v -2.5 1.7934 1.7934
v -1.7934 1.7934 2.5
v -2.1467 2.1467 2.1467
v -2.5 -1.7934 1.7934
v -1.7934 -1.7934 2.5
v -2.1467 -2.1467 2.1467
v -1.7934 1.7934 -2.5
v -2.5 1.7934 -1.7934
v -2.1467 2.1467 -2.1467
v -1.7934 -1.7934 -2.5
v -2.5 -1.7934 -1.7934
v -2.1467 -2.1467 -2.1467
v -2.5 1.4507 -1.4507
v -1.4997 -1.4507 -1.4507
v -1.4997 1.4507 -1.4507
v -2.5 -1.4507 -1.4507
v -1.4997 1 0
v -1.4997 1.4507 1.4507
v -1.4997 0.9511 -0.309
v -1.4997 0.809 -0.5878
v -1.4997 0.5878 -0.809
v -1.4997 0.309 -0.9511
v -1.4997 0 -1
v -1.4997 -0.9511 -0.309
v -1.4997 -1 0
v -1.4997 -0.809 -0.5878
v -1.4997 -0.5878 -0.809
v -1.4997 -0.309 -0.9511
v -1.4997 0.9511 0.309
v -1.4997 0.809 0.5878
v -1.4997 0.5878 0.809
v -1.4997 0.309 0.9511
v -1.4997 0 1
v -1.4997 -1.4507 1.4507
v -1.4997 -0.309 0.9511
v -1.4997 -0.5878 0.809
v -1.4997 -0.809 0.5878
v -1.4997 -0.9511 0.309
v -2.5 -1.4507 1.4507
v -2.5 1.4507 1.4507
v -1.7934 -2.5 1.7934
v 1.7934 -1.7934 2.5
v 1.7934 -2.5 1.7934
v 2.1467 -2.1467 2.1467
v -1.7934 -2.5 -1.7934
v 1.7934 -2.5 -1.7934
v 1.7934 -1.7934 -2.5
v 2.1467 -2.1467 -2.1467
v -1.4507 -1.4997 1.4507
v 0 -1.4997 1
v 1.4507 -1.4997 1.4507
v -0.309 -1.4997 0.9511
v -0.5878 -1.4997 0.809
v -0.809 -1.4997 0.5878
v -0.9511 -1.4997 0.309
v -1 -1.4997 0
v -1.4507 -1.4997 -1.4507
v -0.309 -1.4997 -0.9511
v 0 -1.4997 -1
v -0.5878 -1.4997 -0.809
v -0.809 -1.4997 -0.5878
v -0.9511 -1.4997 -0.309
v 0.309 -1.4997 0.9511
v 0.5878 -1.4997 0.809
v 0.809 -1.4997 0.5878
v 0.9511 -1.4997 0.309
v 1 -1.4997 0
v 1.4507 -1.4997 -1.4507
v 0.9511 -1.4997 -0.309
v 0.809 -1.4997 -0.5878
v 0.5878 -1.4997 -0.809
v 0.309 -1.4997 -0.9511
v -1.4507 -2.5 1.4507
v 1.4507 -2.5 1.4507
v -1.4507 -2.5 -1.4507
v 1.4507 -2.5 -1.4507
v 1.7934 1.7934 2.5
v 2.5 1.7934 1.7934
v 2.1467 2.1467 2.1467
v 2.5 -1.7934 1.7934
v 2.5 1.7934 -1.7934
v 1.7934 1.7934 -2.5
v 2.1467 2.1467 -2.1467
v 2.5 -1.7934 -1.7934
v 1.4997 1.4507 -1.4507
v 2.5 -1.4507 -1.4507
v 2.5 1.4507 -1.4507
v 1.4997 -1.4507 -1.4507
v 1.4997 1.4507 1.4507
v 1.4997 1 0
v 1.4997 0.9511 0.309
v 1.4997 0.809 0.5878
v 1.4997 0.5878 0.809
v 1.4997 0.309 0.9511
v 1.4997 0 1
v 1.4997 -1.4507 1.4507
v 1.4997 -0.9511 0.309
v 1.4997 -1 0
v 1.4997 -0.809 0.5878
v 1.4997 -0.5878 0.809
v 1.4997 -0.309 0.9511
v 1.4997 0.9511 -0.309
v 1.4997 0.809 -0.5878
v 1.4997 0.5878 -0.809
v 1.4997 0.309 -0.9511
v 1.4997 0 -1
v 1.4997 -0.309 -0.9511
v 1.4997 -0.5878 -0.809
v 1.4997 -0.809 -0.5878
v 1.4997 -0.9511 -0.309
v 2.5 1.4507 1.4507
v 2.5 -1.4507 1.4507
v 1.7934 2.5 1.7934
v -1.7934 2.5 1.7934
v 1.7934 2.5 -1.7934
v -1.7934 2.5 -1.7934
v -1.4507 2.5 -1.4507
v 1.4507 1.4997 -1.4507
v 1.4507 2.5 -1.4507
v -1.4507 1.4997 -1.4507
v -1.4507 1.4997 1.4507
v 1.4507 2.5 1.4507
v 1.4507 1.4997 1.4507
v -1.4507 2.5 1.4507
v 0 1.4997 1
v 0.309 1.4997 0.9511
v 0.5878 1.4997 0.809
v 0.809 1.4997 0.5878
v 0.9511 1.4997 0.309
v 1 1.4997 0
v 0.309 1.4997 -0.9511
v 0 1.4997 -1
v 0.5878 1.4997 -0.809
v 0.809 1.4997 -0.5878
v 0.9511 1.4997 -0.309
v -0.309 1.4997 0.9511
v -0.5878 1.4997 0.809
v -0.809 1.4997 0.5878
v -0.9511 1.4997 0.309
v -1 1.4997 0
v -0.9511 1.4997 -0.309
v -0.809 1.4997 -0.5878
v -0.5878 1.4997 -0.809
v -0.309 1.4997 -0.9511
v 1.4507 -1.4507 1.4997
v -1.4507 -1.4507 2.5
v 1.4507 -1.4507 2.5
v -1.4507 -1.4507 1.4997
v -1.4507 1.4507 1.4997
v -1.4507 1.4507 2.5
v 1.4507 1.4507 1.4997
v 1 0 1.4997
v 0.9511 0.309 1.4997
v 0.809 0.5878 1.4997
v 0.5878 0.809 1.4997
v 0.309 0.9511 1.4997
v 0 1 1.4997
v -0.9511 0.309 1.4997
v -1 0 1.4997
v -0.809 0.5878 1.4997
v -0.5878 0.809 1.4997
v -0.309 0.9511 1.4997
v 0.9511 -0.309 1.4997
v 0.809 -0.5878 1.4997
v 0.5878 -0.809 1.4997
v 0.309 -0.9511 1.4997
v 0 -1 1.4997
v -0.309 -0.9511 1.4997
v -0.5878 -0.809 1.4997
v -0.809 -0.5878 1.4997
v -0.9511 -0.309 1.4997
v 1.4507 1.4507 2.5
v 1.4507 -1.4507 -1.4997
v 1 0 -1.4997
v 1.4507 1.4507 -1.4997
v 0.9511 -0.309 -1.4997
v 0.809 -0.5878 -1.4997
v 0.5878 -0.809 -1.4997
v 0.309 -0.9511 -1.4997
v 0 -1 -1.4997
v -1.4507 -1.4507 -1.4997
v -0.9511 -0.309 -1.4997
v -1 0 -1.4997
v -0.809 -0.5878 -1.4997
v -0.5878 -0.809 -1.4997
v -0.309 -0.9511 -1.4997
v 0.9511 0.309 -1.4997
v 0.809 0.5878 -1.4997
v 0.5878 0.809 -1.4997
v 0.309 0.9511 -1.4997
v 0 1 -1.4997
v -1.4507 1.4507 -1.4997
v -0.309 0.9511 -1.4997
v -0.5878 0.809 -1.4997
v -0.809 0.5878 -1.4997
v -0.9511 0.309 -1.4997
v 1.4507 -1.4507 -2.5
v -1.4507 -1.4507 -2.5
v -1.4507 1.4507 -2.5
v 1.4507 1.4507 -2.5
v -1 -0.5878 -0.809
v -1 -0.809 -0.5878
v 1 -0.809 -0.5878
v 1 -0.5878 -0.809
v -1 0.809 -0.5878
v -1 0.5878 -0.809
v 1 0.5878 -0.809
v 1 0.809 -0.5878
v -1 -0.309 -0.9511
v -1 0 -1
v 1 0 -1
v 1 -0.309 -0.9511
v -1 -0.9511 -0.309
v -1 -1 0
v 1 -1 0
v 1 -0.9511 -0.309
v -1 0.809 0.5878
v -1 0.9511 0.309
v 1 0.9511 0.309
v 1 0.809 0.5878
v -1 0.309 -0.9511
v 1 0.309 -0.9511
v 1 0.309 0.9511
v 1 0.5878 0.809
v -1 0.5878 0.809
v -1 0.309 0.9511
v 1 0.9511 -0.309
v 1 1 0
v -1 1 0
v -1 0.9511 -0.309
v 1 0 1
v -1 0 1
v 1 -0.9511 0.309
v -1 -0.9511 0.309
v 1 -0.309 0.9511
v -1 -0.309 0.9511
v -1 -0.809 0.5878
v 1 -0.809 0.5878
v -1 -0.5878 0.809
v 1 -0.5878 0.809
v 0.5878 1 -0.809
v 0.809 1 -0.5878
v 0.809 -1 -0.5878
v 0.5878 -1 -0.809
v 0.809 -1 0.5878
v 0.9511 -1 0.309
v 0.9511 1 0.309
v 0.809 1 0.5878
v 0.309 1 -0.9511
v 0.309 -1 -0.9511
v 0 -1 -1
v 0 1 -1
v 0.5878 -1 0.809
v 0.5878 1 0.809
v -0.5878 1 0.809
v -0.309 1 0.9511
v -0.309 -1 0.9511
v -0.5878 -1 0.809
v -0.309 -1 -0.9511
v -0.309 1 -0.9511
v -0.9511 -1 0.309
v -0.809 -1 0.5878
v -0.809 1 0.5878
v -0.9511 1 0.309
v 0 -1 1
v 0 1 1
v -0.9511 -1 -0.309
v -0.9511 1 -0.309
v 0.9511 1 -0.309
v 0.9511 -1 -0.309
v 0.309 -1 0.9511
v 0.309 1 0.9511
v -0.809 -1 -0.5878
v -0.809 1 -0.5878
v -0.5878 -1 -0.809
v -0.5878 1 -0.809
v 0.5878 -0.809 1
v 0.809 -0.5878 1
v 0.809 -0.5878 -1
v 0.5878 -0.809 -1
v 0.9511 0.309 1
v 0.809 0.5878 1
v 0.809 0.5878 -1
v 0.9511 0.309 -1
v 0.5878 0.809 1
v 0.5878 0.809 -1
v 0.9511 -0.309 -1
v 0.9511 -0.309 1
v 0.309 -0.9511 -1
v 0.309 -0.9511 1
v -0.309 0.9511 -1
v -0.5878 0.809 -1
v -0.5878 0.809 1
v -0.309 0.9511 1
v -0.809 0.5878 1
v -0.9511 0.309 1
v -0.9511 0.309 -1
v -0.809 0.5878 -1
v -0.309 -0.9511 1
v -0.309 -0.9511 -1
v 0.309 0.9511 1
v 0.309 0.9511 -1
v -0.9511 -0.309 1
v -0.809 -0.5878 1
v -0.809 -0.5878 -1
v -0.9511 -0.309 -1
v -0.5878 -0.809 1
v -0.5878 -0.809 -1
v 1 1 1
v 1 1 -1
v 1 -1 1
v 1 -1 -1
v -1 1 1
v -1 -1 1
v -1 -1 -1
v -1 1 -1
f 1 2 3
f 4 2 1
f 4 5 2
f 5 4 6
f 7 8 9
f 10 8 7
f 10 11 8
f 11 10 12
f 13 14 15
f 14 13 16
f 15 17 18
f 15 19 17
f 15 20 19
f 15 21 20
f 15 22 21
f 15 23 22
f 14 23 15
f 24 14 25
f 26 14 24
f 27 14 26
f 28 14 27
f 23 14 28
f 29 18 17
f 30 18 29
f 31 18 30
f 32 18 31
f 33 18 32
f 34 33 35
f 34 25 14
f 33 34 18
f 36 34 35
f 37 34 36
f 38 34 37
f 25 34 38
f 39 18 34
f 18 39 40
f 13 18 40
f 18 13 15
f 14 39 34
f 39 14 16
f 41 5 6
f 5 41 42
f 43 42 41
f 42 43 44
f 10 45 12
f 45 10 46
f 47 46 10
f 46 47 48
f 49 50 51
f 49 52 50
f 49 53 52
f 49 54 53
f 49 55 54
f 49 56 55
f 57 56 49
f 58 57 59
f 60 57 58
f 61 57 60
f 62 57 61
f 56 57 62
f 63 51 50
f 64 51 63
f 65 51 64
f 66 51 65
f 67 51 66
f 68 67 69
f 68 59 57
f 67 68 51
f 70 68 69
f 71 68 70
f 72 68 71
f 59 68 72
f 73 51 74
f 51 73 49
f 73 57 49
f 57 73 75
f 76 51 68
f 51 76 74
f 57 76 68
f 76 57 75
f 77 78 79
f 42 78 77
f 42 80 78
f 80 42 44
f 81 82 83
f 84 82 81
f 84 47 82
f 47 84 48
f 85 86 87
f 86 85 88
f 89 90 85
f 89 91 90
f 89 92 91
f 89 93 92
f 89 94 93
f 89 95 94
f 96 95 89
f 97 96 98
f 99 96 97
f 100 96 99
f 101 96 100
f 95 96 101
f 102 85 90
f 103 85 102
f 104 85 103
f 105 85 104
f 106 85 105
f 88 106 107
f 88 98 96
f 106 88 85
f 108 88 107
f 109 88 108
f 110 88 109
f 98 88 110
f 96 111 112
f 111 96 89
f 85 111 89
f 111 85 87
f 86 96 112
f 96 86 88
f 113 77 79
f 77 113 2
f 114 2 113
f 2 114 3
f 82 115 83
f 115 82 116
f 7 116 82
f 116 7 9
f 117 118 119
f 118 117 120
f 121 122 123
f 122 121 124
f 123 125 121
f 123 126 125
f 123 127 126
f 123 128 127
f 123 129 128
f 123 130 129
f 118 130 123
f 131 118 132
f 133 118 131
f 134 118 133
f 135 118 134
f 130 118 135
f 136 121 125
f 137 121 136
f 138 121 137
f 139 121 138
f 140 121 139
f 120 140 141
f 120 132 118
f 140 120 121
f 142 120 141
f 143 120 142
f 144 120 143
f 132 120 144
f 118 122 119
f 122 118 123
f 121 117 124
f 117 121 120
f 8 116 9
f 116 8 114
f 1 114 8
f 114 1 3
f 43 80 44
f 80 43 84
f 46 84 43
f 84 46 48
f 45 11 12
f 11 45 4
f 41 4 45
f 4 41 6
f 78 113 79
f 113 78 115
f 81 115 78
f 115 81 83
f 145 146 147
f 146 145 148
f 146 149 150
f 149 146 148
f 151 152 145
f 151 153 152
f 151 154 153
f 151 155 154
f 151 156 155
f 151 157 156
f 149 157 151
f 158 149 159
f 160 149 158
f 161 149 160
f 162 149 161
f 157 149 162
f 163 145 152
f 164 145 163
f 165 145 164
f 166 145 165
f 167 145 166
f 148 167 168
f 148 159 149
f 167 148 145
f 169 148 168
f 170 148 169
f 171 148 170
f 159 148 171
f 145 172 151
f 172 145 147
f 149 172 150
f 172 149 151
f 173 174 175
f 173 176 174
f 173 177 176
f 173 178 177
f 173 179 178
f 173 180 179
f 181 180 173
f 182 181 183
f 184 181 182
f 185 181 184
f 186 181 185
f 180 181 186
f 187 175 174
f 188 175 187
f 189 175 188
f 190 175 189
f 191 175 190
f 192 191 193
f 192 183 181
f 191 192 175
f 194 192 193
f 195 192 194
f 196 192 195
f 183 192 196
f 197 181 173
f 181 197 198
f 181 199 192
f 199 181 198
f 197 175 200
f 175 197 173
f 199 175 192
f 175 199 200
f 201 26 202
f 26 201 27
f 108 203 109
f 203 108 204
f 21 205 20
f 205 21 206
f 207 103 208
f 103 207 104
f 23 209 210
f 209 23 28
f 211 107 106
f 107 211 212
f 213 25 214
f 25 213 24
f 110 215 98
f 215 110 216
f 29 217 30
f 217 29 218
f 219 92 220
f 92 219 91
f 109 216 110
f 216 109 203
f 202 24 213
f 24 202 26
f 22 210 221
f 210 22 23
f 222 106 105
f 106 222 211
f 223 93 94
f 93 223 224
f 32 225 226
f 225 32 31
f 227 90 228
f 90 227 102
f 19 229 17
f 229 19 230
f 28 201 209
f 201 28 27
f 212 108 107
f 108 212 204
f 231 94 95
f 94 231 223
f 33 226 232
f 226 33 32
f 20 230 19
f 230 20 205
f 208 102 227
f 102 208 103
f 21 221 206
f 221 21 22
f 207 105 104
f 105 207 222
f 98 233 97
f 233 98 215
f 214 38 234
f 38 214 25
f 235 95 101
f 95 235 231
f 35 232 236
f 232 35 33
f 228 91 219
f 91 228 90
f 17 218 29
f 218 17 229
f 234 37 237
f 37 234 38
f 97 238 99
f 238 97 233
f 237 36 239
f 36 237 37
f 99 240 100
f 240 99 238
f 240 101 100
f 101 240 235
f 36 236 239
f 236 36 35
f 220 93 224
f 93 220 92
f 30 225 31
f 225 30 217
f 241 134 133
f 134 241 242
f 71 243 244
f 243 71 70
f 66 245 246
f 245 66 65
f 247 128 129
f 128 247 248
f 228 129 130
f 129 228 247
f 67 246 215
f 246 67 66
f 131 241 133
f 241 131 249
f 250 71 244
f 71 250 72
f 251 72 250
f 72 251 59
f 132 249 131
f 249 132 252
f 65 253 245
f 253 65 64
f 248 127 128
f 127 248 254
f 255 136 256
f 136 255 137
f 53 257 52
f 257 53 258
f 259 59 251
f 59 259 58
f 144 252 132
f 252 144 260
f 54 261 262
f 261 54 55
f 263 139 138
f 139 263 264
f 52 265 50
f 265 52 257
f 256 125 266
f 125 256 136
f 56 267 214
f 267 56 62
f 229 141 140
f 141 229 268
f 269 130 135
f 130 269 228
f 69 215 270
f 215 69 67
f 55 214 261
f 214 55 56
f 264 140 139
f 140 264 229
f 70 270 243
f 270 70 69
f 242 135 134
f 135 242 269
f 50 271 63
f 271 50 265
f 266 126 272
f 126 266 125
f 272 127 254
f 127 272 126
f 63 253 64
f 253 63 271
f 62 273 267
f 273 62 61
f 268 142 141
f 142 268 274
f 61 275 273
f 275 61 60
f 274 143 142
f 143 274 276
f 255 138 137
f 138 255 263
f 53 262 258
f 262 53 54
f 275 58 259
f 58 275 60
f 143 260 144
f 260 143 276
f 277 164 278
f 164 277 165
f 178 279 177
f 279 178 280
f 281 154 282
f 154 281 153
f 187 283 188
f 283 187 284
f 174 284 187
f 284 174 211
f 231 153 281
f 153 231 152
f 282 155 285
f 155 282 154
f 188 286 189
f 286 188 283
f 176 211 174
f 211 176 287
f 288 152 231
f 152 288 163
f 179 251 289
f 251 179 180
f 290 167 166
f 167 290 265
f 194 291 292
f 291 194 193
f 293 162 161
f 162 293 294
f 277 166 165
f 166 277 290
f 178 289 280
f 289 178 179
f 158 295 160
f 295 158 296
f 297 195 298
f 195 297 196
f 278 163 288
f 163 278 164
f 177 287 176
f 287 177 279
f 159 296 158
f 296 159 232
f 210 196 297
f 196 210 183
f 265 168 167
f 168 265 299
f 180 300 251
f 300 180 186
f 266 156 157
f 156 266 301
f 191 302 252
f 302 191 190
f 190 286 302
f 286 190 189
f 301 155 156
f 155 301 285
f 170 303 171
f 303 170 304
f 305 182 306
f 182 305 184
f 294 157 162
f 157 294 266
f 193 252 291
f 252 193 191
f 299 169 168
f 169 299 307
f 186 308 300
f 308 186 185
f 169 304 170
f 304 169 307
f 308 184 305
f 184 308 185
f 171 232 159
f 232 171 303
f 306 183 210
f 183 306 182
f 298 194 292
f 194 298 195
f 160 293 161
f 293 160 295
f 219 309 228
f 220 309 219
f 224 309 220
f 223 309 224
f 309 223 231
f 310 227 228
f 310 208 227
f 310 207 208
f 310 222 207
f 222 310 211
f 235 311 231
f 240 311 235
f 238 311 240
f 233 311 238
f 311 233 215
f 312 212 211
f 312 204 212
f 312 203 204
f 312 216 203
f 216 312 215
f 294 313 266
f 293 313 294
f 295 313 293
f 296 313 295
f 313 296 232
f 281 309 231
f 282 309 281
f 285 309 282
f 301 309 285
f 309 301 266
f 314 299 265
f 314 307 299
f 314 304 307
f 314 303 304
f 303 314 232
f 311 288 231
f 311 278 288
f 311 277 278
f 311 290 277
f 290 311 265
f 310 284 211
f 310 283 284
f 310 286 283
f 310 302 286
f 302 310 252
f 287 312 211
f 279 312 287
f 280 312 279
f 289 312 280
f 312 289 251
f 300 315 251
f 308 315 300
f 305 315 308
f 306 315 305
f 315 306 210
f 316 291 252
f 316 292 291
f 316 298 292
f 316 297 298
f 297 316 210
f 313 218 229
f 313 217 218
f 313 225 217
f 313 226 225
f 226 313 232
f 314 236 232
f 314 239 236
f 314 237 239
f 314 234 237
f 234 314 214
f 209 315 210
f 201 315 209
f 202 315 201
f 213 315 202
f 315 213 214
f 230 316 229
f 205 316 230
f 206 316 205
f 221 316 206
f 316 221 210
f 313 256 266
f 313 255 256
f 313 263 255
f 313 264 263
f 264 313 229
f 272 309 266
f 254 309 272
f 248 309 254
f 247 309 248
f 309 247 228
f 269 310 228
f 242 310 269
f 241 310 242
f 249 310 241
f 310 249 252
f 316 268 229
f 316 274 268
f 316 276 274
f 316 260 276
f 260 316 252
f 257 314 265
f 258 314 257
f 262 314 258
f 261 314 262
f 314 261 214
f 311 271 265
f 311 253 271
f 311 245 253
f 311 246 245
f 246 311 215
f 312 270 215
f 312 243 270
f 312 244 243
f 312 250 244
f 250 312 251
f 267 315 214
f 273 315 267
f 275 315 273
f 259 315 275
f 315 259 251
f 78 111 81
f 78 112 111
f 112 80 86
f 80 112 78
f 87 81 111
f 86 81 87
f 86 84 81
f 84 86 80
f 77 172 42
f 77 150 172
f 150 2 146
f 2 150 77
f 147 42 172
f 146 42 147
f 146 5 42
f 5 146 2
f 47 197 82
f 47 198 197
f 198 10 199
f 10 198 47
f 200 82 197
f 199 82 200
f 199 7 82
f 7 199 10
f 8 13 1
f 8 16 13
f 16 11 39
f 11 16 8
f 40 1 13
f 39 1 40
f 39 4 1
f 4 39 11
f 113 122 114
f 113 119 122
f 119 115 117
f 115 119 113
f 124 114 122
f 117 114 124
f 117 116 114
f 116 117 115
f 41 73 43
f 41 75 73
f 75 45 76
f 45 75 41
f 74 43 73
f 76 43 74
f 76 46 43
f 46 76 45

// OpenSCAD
shaft_radius = 1;
$fn = 20;



module girdir(x_size=1, y_size=1, shaft_radius = shaft_radius)
{
    
    // Make primitive cube.
    hexad = 1.0000*[5,5,5];
    // Extract length.
    hexad_length = hexad[0];
    
    difference()
    {
        for ( x_step = [ 0 : hexad_length : hexad_length * x_size - 1] )
        {
            for ( y_step = [ 0 : hexad_length : hexad_length * y_size - 1] )
            {
                difference()
                {
                    union()
                    {
                        // Creates the cube.
                        translate([x_step, y_step, 0])
                        {
                            cube(hexad, center = true);
                        }
                    }
                    
                    x_final = hexad_length * x_size - hexad_length;
                    y_final = hexad_length * y_size - hexad_length;
                    
                    // Special treatment operations.
                    translate([x_step, y_step, 0])
                    {
                        
                        // Treat First.
                        if (x_step == 0)
                        {
                            girdir_trim("y","-x","+z");
                            girdir_trim("y","-x","-z");
                            girdir_cavity("-x");

                        }
                        
                        // Treat First.
                        if (y_step == 0)
                        {
                            girdir_trim("x","-y","+z");
                            girdir_trim("x","-y","-z");
                            girdir_cavity("-y");
                        }
                        
                        if (x_step == 0 && y_step == 0)
                        {
                            girdir_trim("z","-y","-x");
                        }
                       
                        // Treat First.
                        if (x_step == x_final)
                        {
                            girdir_trim("y","+x","+z");
                            girdir_trim("y","+x","-z");
                            girdir_cavity("+x");
                        }
                        
                        // Treat First.
                        if (y_step == y_final)
                        {
                            girdir_trim("x","+y","+z");
                            girdir_trim("x","+y","-z");
                            girdir_cavity("+y");
                        }
                        
                        if (x_step == 0 && y_step == y_final)
                        {
                            girdir_trim("z","+y","-x");
                            girdir_trim("x","+y","+z");
                            girdir_trim("x","+y","-z");
                        }
                        
                        if (x_step == x_final && y_step == 0)
                        {
                            girdir_trim("y","+x","+z");
                            girdir_trim("y","+x","-z");
                            girdir_trim("z","-y","+x");
                        }
                        
                        if (x_step == x_final && y_step == y_final)
                        {
                            girdir_trim("z","+y","+x");
                   
                        }
                        girdir_cavity("+z");
                        girdir_cavity("-z");
                    }
                    
                    // Shafts.
                    translate([x_step, y_step, 0])
                    {
                        
                        // Cylinder along  x axis.
                        rotate([0,90,0])
                        {
                            cylinder( h = 20, r1 = shaft_radius, r2=shaft_radius, center=true );
                        }
                        // Cylinder along  y axis.
                        rotate([90,0,0])
                        {
                            cylinder( h = 20, r1 = shaft_radius, r2=shaft_radius, center=true );
                        }
                        // Cylinder along  z axis.
                        
                        
                        cylinder( h = 20, r1 = shaft_radius, r2=shaft_radius, center=true );
                        
                        
                        
                       
                        
                    }
                    
                    // Inner flush.
                    translate([x_step, y_step, 0])
                    {
                        girdir_flush();
                    }
                }

            }
        }
        
    }
}

module prime_girdir(x_size=1, y_size=1, shaft_radius = shaft_radius)
{
    
    // Make primitive cube.
    hexad = 1.00001*[5,5,5];
    // Extract length.
    hexad_length = hexad[0];
    
    difference()
    {
        for ( x_step = [ 0 : hexad_length : hexad_length * x_size - 1] )
        {
            for ( y_step = [ 0 : hexad_length : hexad_length * y_size - 1] )
            {
                difference()
                {
                    union()
                    {
                        // Creates the cube.
                        translate([x_step, y_step, 0])
                        {
                            cube(hexad, center = true);
                        }
                    }
                    
                    x_final = hexad_length * x_size - hexad_length;
                    y_final = hexad_length * y_size - hexad_length;
                    z_final = hexad_length * z_size - hexad_length;
                    
                    // Special treatment operations.
                    translate([x_step, y_step, 0])
                    {
                        
                        // Treat First.
                        if (x_step == 0)
                        {
                            //girdir_trim("y","-x","+z");
                            //girdir_trim("y","-x","-z");
                            //girdir_cavity("-x");

                        }
                        
                        // Treat First.
                        if (y_step == 0)
                        {
                            //girdir_trim("x","-y","+z");
                            //girdir_trim("x","-y","-z");
                            //girdir_cavity("-y");
                        }
                        
                        if (x_step == 0 && y_step == 0)
                        {
                            //girdir_trim("z","-y","-x");
                        }
                       
                        // Treat First.
                        if (x_step == x_final)
                        {
                            //girdir_trim("y","+x","+z");
                            //girdir_trim("y","+x","-z");
                            //girdir_cavity("+x");
                        }
                        
                        // Treat First.
                        if (y_step == y_final)
                        {
                            //girdir_trim("x","+y","+z");
                            //girdir_trim("x","+y","-z");
                            //girdir_cavity("+y");
                        }
                        
                        if (x_step == 0 && y_step == y_final)
                        {
                            //girdir_trim("z","+y","-x");
                            //girdir_trim("x","+y","+z");
                            //girdir_trim("x","+y","-z");
                        }
                        
                        if (x_step == x_final && y_step == 0)
                        {
                            //girdir_trim("y","+x","+z");
                            //girdir_trim("y","+x","-z");
                            //girdir_trim("z","-y","+x");
                        }
                        
                        if (x_step == x_final && y_step == y_final)
                        {
                            //girdir_trim("z","+y","+x");
                        }
                        //girdir_cavity("+z");
                        //girdir_cavity("-z");
                    }
                    
                    // Shafts.
                    translate([x_step, y_step, 0])
                    {
                        
                        // Cylinder along  x axis.
                        rotate([0,90,0])
                        {
                            //cylinder( h = 20, r1 = shaft_radius, r2=shaft_radius, center=true );
                        }
                        // Cylinder along  y axis.
                        rotate([90,0,0])
                        {
                            //cylinder( h = 20, r1 = shaft_radius, r2=shaft_radius, center=true );
                        }
                        // Cylinder along  z axis.
                        
                        
                        //cylinder( h = 20, r1 = shaft_radius, r2=shaft_radius, center=true );
                        
                        
                        
                       
                        
                    }
                    
                    // Inner flush.
                    translate([x_step, y_step, 0])
                    {
                        //girdir_flush();
                    }
                }

            }
        }
        
    }
}





module girdir_peg(side)
{
    
    hexad = 1.0005*[5,5,10];
    cavity = [0.5*hexad[0],0.5*hexad[1],0.2*hexad[2]];
    
    if (side == "+x")
    {
        translate([2.25 - 0.005, 0, 0])
        {
            rotate([0,90,0])
            {
                cube(cavity, center = true);
            }
        }
    }
    else if (side == "-x")
    {
        translate([-(2.25 - 0.005), 0, 0])
        {
            rotate([0,90,0])
            {
                cube(cavity, center = true);
            }
        }
    }
    else if (side == "+y")
    {
        translate([0, 2.25 - 0.005, 0])
        {
            rotate([0,90,90])
            {
                cube(cavity, center = true);
            }
        }
    }
    else if (side == "-y")
    {
        translate([0, -(2.25 - 0.005), 0])
        {
            rotate([0,90,90])
            {
                cube(cavity, center = true);
            }
        }
    }
    else if (side == "+z")
    {
        translate([0, 0, 2.25 - 0.005])
        {
            rotate([0,0,90])
            {
                cube(cavity, center = true);
            }
        }
    }
    else if (side == "-z")
    {
        translate([0, 0, -(2.25 - 0.005)])
        {
            rotate([0,0,90])
            {
                cube(cavity, center = true);
            }
        }
    }
    else
    {
        
    }
}

module girdir_cavity(side)
{
    
    hexad = 1.0005*[5,5,5];
    cavity = [0.58*hexad[0],0.58*hexad[1],0.2*hexad[2]];
    if (side == "+x")
    {
        translate([2, 0, 0])
        {
            rotate([0,90,0])
            {
                cube(cavity, center = true);
            }
        }
    }
    else if (side == "-x")
    {
        translate([-2, 0, 0])
        {
            rotate([0,90,0])
            {
                cube(cavity, center = true);
            }
        }
    }
    else if (side == "+y")
    {
        translate([0, 2, 0])
        {
            rotate([0,90,90])
            {
                cube(cavity, center = true);
            }
        }
    }
    else if (side == "-y")
    {
        translate([0, -2, 0])
        {
            rotate([0,90,90])
            {
                cube(cavity, center = true);
            }
        }
    }
    else if (side == "+z")
    {
        translate([0, 0, 2])
        {
            rotate([0,0,90])
            {
                cube(cavity, center = true);
            }
        }
    }
    else if (side == "-z")
    {
        translate([0, 0, -2])
        {
            rotate([0,0,90])
            {
                cube(cavity, center = true);
            }
        }
    }
    else
    {
        
    }
}

module girdir_shaft(axis)
{
    if (axis == "x")
    {
        
    }
    else if (axis == "y")
    {
        
    }
    else if (axis == "z")
    {
        
    }
    else
    {
        
    }

}


module girdir_trim(axis, side, edge)
{
    trim = 1.0001*[5,0.5,1];
    centroid_distance = 0.4647 * 5;
    
    if (axis == "z")
    {
        if (side == "+x")
        {
            if (edge == "+y")
            {
                translate([centroid_distance, centroid_distance, 0])
                {
                    rotate([45,90,0])
                    {
                        cube(trim, center = true);
                    }
                }
            }
            else if (edge == "-y")
            {
                translate([centroid_distance, -centroid_distance, 0])
                {
                    rotate([-45,90,0])
                    {
                        cube(trim, center = true);
                    }
                }
            }
            else
            {
            
            }
        }
        else if (side == "-x")
        {
            
            if (edge == "+y")
            {
                translate([-centroid_distance, centroid_distance, 0])
                {
                    rotate([-45,90,0])
                    {
                        cube(trim, center = true);
                    }
                }
            }
            else if (edge == "-y")
            {
                translate([-centroid_distance, -centroid_distance, 0])
                {
                    rotate([45,90,0])
                    {
                        cube(trim, center = true);
                    }
                }
            }
            else
            {
            
            }
            
        }
        else if (side == "+y")
        {
            
            if (edge == "+x")
            {
                translate([centroid_distance, centroid_distance, 0])
                {
                    rotate([45,90,0])
                    {
                        cube(trim, center = true);
                    }
                }
            }
            else if (edge == "-x")
            {
                translate([-centroid_distance, centroid_distance, 0])
                {
                    rotate([-45,90,0])
                    {
                        cube(trim, center = true);
                    }
                }
            }
            else
            {
            
            }
        }
        else if (side == "-y")
        {

            if (edge == "+x")
            {
                translate([centroid_distance, -centroid_distance, 0])
                {
                    rotate([-45,90,0])
                    {
                        cube(trim, center = true);
                    }
                }
            }
            else if (edge == "-x")
            {
                translate([-centroid_distance, -centroid_distance, 0])
                {
                    rotate([45,90,0])
                    {
                        cube(trim, center = true);
                    }
                }
            }
            else
            {
            
            }
        }
        else
        {

        }
    }
    
    else if (axis == "x")
    {
        if (side == "+y")
        {
            if (edge == "+z")
            {
                translate([0, centroid_distance, centroid_distance])
                {
                    rotate([45,0,0])
                    {
                        cube(trim, center = true);
                    }
                }
            }
            else if (edge == "-z")
            {
                translate([0, centroid_distance, -centroid_distance])
                {
                    rotate([-45,0,0])
                    {
                        cube(trim, center = true);
                    }
                }
            }
            else
            {
            
            }
        }
        else if (side == "-y")
        {
            if (edge == "+z")
            {
                translate([0, -centroid_distance, centroid_distance])
                {
                    rotate([-45,0,0])
                    {
                        cube(trim, center = true);
                    }
                }
            }
            else if (edge == "-z")
            {
                translate([0,-centroid_distance, -centroid_distance])
                {
                    rotate([45,0,0])
                    {
                        cube(trim, center = true);
                    }
                }
            }
            else
            {
            
            }
            
        }
        else if (side == "+z")
        {
            
            
            if (edge == "+y")
            {
                translate([0, centroid_distance, centroid_distance])
                {
                    rotate([45,0,0])
                    {
                        cube(trim, center = true);
                    }
                }
            }
            else if (edge == "-y")
            {
                translate([0, -centroid_distance, centroid_distance])
                {
                    rotate([-45,0,0])
                    {
                        cube(trim, center = true);
                    }
                }
            }
            else
            {
            
            }
            
           

        }
        else if (side == "-z")
        {
            
            
            if (edge == "+y")
            {
                translate([0, centroid_distance, -centroid_distance])
                {
                    rotate([-45,0,0])
                    {
                        cube(trim, center = true);
                    }
                }
            }
            else if (edge == "-y")
            {
                translate([0,-centroid_distance, -centroid_distance])
                {
                    rotate([45,0,0])
                    {
                        cube(trim, center = true);
                    }
                }
            }
            else
            {
            
            }
        }
        else
        {

        }
    }
    
    else if (axis == "y")
    {
        if (side == "+x")
        {
            if (edge == "+z")
            {
                translate([centroid_distance, 0 ,centroid_distance])
                {
                    rotate([45,0,-90])
                    {
                        cube(trim, center = true);
                    }
                }
            }
            else if (edge == "-z")
            {
                translate([centroid_distance, 0, -centroid_distance])
                {
                    rotate([-45,0,-90])
                    {
                        cube(trim, center = true);
                    }
                }
            }
            else
            {
            
            }
        }
        else if (side == "-x")
        {
            
            if (edge == "+z")
            {
                translate([-centroid_distance, 0, centroid_distance])
                {
                    rotate([-45,0,-90])
                    {
                        cube(trim, center = true);
                    }
                }
            }
            else if (edge == "-z")
            {
                translate([-centroid_distance, 0, -centroid_distance])
                {
                    rotate([45,0,-90])
                    {
                        cube(trim, center = true);
                    }
                }
            }
            else
            {
            
            }
        }
        else if (side == "+z")
        {
            if (edge == "+x")
            {
                translate([centroid_distance, 0 ,centroid_distance])
                {
                    rotate([45,0,-90])
                    {
                        cube(trim, center = true);
                    }
                }
            }
            else if (edge == "-x")
            {
                translate([-centroid_distance, 0, centroid_distance])
                {
                    rotate([-45,0,-90])
                    {
                        cube(trim, center = true);
                    }
                }
            }
            else
            {
            
            }
        }
        else if (side == "-z")
        {
            if (edge == "+x")
            {
                translate([centroid_distance, 0, -centroid_distance])
                {
                    rotate([-45,0,-90])
                    {
                        cube(trim, center = true);
                    }
                }
            }
            else if (edge == "-x")
            {
                translate([-centroid_distance, 0, -centroid_distance])
                {
                    rotate([45,0,-90])
                    {
                        cube(trim, center = true);
                    }
                }
            }
            else
            {
            
            }
        }
        else
        {

        }
    }
}


module girdir_flush(shaft_radius = shaft_radius)
{
    hexad = [5,5,5];
    rotate([90,0,0])
    {
        cylinder( h = 2.5, r1 = shaft_radius, r2=shaft_radius, center=true );
    }
    rotate([0,0,0])
    {
        cylinder( h = 2.5, r1 = shaft_radius, r2=shaft_radius, center=true );
    }
    rotate([0,90,0])
    {
        cylinder( h = 2.5, r1 = shaft_radius, r2=shaft_radius, center=true );
    }
    translate([0, 0, 0])
    {
        cube(0.4*hexad, center = true);
    }
}


module girdir_endslot()
{


}

module girdir_grooves()
{


}








module corner_piece()
{
    translate([0,0,0])
    {
        girdir(1,1);
    }
    translate([0,0,-5])
    {
        girdir(1,1);
    }
    translate([-5,0,0])
    {
        girdir(1,1);
    }
    translate([0,-5,0])
    {
        girdir(1,1);
    }
    translate([5,0,0])
    {
        girdir(1,1);
    }
    translate([0,5,0])
    {
        girdir(1,1);
    }
    translate([0,0,5])
    {
        girdir(1,1);
    }
    translate([-5,5,0])
    {
        girdir(1,1);
    }
    translate([0,5,-5])
    {
        girdir(1,1);
    }
    translate([5,-5,0])
    {
        girdir(1,1);
    }
    translate([0,-5,5])
    {
        girdir(1,1);
    }
    translate([-5,0,5])
    {
        girdir(1,1);
    }
    translate([5,0,-5])
    {
        girdir(1,1);
    }
    
    translate([5,0,-10])
    {
        girdir(1,1);
    }
    
    translate([0,5,0])
    {
        girdir(1,1);
    }
    
    translate([-10,5,0])
    {
        girdir(1,1);
    }
    
    translate([0,5,-10])
    {
        girdir(1,1);
    }
    
    translate([-10,0,5])
    {
        girdir(1,1);
    }
    
    translate([0,-10,5])
    {
        girdir(1,1);
    }
    
    translate([5,-10,0])
    {
        girdir(1,1);
    }
    
}



girdir(1,1);


//prime_girdir(1,10);
